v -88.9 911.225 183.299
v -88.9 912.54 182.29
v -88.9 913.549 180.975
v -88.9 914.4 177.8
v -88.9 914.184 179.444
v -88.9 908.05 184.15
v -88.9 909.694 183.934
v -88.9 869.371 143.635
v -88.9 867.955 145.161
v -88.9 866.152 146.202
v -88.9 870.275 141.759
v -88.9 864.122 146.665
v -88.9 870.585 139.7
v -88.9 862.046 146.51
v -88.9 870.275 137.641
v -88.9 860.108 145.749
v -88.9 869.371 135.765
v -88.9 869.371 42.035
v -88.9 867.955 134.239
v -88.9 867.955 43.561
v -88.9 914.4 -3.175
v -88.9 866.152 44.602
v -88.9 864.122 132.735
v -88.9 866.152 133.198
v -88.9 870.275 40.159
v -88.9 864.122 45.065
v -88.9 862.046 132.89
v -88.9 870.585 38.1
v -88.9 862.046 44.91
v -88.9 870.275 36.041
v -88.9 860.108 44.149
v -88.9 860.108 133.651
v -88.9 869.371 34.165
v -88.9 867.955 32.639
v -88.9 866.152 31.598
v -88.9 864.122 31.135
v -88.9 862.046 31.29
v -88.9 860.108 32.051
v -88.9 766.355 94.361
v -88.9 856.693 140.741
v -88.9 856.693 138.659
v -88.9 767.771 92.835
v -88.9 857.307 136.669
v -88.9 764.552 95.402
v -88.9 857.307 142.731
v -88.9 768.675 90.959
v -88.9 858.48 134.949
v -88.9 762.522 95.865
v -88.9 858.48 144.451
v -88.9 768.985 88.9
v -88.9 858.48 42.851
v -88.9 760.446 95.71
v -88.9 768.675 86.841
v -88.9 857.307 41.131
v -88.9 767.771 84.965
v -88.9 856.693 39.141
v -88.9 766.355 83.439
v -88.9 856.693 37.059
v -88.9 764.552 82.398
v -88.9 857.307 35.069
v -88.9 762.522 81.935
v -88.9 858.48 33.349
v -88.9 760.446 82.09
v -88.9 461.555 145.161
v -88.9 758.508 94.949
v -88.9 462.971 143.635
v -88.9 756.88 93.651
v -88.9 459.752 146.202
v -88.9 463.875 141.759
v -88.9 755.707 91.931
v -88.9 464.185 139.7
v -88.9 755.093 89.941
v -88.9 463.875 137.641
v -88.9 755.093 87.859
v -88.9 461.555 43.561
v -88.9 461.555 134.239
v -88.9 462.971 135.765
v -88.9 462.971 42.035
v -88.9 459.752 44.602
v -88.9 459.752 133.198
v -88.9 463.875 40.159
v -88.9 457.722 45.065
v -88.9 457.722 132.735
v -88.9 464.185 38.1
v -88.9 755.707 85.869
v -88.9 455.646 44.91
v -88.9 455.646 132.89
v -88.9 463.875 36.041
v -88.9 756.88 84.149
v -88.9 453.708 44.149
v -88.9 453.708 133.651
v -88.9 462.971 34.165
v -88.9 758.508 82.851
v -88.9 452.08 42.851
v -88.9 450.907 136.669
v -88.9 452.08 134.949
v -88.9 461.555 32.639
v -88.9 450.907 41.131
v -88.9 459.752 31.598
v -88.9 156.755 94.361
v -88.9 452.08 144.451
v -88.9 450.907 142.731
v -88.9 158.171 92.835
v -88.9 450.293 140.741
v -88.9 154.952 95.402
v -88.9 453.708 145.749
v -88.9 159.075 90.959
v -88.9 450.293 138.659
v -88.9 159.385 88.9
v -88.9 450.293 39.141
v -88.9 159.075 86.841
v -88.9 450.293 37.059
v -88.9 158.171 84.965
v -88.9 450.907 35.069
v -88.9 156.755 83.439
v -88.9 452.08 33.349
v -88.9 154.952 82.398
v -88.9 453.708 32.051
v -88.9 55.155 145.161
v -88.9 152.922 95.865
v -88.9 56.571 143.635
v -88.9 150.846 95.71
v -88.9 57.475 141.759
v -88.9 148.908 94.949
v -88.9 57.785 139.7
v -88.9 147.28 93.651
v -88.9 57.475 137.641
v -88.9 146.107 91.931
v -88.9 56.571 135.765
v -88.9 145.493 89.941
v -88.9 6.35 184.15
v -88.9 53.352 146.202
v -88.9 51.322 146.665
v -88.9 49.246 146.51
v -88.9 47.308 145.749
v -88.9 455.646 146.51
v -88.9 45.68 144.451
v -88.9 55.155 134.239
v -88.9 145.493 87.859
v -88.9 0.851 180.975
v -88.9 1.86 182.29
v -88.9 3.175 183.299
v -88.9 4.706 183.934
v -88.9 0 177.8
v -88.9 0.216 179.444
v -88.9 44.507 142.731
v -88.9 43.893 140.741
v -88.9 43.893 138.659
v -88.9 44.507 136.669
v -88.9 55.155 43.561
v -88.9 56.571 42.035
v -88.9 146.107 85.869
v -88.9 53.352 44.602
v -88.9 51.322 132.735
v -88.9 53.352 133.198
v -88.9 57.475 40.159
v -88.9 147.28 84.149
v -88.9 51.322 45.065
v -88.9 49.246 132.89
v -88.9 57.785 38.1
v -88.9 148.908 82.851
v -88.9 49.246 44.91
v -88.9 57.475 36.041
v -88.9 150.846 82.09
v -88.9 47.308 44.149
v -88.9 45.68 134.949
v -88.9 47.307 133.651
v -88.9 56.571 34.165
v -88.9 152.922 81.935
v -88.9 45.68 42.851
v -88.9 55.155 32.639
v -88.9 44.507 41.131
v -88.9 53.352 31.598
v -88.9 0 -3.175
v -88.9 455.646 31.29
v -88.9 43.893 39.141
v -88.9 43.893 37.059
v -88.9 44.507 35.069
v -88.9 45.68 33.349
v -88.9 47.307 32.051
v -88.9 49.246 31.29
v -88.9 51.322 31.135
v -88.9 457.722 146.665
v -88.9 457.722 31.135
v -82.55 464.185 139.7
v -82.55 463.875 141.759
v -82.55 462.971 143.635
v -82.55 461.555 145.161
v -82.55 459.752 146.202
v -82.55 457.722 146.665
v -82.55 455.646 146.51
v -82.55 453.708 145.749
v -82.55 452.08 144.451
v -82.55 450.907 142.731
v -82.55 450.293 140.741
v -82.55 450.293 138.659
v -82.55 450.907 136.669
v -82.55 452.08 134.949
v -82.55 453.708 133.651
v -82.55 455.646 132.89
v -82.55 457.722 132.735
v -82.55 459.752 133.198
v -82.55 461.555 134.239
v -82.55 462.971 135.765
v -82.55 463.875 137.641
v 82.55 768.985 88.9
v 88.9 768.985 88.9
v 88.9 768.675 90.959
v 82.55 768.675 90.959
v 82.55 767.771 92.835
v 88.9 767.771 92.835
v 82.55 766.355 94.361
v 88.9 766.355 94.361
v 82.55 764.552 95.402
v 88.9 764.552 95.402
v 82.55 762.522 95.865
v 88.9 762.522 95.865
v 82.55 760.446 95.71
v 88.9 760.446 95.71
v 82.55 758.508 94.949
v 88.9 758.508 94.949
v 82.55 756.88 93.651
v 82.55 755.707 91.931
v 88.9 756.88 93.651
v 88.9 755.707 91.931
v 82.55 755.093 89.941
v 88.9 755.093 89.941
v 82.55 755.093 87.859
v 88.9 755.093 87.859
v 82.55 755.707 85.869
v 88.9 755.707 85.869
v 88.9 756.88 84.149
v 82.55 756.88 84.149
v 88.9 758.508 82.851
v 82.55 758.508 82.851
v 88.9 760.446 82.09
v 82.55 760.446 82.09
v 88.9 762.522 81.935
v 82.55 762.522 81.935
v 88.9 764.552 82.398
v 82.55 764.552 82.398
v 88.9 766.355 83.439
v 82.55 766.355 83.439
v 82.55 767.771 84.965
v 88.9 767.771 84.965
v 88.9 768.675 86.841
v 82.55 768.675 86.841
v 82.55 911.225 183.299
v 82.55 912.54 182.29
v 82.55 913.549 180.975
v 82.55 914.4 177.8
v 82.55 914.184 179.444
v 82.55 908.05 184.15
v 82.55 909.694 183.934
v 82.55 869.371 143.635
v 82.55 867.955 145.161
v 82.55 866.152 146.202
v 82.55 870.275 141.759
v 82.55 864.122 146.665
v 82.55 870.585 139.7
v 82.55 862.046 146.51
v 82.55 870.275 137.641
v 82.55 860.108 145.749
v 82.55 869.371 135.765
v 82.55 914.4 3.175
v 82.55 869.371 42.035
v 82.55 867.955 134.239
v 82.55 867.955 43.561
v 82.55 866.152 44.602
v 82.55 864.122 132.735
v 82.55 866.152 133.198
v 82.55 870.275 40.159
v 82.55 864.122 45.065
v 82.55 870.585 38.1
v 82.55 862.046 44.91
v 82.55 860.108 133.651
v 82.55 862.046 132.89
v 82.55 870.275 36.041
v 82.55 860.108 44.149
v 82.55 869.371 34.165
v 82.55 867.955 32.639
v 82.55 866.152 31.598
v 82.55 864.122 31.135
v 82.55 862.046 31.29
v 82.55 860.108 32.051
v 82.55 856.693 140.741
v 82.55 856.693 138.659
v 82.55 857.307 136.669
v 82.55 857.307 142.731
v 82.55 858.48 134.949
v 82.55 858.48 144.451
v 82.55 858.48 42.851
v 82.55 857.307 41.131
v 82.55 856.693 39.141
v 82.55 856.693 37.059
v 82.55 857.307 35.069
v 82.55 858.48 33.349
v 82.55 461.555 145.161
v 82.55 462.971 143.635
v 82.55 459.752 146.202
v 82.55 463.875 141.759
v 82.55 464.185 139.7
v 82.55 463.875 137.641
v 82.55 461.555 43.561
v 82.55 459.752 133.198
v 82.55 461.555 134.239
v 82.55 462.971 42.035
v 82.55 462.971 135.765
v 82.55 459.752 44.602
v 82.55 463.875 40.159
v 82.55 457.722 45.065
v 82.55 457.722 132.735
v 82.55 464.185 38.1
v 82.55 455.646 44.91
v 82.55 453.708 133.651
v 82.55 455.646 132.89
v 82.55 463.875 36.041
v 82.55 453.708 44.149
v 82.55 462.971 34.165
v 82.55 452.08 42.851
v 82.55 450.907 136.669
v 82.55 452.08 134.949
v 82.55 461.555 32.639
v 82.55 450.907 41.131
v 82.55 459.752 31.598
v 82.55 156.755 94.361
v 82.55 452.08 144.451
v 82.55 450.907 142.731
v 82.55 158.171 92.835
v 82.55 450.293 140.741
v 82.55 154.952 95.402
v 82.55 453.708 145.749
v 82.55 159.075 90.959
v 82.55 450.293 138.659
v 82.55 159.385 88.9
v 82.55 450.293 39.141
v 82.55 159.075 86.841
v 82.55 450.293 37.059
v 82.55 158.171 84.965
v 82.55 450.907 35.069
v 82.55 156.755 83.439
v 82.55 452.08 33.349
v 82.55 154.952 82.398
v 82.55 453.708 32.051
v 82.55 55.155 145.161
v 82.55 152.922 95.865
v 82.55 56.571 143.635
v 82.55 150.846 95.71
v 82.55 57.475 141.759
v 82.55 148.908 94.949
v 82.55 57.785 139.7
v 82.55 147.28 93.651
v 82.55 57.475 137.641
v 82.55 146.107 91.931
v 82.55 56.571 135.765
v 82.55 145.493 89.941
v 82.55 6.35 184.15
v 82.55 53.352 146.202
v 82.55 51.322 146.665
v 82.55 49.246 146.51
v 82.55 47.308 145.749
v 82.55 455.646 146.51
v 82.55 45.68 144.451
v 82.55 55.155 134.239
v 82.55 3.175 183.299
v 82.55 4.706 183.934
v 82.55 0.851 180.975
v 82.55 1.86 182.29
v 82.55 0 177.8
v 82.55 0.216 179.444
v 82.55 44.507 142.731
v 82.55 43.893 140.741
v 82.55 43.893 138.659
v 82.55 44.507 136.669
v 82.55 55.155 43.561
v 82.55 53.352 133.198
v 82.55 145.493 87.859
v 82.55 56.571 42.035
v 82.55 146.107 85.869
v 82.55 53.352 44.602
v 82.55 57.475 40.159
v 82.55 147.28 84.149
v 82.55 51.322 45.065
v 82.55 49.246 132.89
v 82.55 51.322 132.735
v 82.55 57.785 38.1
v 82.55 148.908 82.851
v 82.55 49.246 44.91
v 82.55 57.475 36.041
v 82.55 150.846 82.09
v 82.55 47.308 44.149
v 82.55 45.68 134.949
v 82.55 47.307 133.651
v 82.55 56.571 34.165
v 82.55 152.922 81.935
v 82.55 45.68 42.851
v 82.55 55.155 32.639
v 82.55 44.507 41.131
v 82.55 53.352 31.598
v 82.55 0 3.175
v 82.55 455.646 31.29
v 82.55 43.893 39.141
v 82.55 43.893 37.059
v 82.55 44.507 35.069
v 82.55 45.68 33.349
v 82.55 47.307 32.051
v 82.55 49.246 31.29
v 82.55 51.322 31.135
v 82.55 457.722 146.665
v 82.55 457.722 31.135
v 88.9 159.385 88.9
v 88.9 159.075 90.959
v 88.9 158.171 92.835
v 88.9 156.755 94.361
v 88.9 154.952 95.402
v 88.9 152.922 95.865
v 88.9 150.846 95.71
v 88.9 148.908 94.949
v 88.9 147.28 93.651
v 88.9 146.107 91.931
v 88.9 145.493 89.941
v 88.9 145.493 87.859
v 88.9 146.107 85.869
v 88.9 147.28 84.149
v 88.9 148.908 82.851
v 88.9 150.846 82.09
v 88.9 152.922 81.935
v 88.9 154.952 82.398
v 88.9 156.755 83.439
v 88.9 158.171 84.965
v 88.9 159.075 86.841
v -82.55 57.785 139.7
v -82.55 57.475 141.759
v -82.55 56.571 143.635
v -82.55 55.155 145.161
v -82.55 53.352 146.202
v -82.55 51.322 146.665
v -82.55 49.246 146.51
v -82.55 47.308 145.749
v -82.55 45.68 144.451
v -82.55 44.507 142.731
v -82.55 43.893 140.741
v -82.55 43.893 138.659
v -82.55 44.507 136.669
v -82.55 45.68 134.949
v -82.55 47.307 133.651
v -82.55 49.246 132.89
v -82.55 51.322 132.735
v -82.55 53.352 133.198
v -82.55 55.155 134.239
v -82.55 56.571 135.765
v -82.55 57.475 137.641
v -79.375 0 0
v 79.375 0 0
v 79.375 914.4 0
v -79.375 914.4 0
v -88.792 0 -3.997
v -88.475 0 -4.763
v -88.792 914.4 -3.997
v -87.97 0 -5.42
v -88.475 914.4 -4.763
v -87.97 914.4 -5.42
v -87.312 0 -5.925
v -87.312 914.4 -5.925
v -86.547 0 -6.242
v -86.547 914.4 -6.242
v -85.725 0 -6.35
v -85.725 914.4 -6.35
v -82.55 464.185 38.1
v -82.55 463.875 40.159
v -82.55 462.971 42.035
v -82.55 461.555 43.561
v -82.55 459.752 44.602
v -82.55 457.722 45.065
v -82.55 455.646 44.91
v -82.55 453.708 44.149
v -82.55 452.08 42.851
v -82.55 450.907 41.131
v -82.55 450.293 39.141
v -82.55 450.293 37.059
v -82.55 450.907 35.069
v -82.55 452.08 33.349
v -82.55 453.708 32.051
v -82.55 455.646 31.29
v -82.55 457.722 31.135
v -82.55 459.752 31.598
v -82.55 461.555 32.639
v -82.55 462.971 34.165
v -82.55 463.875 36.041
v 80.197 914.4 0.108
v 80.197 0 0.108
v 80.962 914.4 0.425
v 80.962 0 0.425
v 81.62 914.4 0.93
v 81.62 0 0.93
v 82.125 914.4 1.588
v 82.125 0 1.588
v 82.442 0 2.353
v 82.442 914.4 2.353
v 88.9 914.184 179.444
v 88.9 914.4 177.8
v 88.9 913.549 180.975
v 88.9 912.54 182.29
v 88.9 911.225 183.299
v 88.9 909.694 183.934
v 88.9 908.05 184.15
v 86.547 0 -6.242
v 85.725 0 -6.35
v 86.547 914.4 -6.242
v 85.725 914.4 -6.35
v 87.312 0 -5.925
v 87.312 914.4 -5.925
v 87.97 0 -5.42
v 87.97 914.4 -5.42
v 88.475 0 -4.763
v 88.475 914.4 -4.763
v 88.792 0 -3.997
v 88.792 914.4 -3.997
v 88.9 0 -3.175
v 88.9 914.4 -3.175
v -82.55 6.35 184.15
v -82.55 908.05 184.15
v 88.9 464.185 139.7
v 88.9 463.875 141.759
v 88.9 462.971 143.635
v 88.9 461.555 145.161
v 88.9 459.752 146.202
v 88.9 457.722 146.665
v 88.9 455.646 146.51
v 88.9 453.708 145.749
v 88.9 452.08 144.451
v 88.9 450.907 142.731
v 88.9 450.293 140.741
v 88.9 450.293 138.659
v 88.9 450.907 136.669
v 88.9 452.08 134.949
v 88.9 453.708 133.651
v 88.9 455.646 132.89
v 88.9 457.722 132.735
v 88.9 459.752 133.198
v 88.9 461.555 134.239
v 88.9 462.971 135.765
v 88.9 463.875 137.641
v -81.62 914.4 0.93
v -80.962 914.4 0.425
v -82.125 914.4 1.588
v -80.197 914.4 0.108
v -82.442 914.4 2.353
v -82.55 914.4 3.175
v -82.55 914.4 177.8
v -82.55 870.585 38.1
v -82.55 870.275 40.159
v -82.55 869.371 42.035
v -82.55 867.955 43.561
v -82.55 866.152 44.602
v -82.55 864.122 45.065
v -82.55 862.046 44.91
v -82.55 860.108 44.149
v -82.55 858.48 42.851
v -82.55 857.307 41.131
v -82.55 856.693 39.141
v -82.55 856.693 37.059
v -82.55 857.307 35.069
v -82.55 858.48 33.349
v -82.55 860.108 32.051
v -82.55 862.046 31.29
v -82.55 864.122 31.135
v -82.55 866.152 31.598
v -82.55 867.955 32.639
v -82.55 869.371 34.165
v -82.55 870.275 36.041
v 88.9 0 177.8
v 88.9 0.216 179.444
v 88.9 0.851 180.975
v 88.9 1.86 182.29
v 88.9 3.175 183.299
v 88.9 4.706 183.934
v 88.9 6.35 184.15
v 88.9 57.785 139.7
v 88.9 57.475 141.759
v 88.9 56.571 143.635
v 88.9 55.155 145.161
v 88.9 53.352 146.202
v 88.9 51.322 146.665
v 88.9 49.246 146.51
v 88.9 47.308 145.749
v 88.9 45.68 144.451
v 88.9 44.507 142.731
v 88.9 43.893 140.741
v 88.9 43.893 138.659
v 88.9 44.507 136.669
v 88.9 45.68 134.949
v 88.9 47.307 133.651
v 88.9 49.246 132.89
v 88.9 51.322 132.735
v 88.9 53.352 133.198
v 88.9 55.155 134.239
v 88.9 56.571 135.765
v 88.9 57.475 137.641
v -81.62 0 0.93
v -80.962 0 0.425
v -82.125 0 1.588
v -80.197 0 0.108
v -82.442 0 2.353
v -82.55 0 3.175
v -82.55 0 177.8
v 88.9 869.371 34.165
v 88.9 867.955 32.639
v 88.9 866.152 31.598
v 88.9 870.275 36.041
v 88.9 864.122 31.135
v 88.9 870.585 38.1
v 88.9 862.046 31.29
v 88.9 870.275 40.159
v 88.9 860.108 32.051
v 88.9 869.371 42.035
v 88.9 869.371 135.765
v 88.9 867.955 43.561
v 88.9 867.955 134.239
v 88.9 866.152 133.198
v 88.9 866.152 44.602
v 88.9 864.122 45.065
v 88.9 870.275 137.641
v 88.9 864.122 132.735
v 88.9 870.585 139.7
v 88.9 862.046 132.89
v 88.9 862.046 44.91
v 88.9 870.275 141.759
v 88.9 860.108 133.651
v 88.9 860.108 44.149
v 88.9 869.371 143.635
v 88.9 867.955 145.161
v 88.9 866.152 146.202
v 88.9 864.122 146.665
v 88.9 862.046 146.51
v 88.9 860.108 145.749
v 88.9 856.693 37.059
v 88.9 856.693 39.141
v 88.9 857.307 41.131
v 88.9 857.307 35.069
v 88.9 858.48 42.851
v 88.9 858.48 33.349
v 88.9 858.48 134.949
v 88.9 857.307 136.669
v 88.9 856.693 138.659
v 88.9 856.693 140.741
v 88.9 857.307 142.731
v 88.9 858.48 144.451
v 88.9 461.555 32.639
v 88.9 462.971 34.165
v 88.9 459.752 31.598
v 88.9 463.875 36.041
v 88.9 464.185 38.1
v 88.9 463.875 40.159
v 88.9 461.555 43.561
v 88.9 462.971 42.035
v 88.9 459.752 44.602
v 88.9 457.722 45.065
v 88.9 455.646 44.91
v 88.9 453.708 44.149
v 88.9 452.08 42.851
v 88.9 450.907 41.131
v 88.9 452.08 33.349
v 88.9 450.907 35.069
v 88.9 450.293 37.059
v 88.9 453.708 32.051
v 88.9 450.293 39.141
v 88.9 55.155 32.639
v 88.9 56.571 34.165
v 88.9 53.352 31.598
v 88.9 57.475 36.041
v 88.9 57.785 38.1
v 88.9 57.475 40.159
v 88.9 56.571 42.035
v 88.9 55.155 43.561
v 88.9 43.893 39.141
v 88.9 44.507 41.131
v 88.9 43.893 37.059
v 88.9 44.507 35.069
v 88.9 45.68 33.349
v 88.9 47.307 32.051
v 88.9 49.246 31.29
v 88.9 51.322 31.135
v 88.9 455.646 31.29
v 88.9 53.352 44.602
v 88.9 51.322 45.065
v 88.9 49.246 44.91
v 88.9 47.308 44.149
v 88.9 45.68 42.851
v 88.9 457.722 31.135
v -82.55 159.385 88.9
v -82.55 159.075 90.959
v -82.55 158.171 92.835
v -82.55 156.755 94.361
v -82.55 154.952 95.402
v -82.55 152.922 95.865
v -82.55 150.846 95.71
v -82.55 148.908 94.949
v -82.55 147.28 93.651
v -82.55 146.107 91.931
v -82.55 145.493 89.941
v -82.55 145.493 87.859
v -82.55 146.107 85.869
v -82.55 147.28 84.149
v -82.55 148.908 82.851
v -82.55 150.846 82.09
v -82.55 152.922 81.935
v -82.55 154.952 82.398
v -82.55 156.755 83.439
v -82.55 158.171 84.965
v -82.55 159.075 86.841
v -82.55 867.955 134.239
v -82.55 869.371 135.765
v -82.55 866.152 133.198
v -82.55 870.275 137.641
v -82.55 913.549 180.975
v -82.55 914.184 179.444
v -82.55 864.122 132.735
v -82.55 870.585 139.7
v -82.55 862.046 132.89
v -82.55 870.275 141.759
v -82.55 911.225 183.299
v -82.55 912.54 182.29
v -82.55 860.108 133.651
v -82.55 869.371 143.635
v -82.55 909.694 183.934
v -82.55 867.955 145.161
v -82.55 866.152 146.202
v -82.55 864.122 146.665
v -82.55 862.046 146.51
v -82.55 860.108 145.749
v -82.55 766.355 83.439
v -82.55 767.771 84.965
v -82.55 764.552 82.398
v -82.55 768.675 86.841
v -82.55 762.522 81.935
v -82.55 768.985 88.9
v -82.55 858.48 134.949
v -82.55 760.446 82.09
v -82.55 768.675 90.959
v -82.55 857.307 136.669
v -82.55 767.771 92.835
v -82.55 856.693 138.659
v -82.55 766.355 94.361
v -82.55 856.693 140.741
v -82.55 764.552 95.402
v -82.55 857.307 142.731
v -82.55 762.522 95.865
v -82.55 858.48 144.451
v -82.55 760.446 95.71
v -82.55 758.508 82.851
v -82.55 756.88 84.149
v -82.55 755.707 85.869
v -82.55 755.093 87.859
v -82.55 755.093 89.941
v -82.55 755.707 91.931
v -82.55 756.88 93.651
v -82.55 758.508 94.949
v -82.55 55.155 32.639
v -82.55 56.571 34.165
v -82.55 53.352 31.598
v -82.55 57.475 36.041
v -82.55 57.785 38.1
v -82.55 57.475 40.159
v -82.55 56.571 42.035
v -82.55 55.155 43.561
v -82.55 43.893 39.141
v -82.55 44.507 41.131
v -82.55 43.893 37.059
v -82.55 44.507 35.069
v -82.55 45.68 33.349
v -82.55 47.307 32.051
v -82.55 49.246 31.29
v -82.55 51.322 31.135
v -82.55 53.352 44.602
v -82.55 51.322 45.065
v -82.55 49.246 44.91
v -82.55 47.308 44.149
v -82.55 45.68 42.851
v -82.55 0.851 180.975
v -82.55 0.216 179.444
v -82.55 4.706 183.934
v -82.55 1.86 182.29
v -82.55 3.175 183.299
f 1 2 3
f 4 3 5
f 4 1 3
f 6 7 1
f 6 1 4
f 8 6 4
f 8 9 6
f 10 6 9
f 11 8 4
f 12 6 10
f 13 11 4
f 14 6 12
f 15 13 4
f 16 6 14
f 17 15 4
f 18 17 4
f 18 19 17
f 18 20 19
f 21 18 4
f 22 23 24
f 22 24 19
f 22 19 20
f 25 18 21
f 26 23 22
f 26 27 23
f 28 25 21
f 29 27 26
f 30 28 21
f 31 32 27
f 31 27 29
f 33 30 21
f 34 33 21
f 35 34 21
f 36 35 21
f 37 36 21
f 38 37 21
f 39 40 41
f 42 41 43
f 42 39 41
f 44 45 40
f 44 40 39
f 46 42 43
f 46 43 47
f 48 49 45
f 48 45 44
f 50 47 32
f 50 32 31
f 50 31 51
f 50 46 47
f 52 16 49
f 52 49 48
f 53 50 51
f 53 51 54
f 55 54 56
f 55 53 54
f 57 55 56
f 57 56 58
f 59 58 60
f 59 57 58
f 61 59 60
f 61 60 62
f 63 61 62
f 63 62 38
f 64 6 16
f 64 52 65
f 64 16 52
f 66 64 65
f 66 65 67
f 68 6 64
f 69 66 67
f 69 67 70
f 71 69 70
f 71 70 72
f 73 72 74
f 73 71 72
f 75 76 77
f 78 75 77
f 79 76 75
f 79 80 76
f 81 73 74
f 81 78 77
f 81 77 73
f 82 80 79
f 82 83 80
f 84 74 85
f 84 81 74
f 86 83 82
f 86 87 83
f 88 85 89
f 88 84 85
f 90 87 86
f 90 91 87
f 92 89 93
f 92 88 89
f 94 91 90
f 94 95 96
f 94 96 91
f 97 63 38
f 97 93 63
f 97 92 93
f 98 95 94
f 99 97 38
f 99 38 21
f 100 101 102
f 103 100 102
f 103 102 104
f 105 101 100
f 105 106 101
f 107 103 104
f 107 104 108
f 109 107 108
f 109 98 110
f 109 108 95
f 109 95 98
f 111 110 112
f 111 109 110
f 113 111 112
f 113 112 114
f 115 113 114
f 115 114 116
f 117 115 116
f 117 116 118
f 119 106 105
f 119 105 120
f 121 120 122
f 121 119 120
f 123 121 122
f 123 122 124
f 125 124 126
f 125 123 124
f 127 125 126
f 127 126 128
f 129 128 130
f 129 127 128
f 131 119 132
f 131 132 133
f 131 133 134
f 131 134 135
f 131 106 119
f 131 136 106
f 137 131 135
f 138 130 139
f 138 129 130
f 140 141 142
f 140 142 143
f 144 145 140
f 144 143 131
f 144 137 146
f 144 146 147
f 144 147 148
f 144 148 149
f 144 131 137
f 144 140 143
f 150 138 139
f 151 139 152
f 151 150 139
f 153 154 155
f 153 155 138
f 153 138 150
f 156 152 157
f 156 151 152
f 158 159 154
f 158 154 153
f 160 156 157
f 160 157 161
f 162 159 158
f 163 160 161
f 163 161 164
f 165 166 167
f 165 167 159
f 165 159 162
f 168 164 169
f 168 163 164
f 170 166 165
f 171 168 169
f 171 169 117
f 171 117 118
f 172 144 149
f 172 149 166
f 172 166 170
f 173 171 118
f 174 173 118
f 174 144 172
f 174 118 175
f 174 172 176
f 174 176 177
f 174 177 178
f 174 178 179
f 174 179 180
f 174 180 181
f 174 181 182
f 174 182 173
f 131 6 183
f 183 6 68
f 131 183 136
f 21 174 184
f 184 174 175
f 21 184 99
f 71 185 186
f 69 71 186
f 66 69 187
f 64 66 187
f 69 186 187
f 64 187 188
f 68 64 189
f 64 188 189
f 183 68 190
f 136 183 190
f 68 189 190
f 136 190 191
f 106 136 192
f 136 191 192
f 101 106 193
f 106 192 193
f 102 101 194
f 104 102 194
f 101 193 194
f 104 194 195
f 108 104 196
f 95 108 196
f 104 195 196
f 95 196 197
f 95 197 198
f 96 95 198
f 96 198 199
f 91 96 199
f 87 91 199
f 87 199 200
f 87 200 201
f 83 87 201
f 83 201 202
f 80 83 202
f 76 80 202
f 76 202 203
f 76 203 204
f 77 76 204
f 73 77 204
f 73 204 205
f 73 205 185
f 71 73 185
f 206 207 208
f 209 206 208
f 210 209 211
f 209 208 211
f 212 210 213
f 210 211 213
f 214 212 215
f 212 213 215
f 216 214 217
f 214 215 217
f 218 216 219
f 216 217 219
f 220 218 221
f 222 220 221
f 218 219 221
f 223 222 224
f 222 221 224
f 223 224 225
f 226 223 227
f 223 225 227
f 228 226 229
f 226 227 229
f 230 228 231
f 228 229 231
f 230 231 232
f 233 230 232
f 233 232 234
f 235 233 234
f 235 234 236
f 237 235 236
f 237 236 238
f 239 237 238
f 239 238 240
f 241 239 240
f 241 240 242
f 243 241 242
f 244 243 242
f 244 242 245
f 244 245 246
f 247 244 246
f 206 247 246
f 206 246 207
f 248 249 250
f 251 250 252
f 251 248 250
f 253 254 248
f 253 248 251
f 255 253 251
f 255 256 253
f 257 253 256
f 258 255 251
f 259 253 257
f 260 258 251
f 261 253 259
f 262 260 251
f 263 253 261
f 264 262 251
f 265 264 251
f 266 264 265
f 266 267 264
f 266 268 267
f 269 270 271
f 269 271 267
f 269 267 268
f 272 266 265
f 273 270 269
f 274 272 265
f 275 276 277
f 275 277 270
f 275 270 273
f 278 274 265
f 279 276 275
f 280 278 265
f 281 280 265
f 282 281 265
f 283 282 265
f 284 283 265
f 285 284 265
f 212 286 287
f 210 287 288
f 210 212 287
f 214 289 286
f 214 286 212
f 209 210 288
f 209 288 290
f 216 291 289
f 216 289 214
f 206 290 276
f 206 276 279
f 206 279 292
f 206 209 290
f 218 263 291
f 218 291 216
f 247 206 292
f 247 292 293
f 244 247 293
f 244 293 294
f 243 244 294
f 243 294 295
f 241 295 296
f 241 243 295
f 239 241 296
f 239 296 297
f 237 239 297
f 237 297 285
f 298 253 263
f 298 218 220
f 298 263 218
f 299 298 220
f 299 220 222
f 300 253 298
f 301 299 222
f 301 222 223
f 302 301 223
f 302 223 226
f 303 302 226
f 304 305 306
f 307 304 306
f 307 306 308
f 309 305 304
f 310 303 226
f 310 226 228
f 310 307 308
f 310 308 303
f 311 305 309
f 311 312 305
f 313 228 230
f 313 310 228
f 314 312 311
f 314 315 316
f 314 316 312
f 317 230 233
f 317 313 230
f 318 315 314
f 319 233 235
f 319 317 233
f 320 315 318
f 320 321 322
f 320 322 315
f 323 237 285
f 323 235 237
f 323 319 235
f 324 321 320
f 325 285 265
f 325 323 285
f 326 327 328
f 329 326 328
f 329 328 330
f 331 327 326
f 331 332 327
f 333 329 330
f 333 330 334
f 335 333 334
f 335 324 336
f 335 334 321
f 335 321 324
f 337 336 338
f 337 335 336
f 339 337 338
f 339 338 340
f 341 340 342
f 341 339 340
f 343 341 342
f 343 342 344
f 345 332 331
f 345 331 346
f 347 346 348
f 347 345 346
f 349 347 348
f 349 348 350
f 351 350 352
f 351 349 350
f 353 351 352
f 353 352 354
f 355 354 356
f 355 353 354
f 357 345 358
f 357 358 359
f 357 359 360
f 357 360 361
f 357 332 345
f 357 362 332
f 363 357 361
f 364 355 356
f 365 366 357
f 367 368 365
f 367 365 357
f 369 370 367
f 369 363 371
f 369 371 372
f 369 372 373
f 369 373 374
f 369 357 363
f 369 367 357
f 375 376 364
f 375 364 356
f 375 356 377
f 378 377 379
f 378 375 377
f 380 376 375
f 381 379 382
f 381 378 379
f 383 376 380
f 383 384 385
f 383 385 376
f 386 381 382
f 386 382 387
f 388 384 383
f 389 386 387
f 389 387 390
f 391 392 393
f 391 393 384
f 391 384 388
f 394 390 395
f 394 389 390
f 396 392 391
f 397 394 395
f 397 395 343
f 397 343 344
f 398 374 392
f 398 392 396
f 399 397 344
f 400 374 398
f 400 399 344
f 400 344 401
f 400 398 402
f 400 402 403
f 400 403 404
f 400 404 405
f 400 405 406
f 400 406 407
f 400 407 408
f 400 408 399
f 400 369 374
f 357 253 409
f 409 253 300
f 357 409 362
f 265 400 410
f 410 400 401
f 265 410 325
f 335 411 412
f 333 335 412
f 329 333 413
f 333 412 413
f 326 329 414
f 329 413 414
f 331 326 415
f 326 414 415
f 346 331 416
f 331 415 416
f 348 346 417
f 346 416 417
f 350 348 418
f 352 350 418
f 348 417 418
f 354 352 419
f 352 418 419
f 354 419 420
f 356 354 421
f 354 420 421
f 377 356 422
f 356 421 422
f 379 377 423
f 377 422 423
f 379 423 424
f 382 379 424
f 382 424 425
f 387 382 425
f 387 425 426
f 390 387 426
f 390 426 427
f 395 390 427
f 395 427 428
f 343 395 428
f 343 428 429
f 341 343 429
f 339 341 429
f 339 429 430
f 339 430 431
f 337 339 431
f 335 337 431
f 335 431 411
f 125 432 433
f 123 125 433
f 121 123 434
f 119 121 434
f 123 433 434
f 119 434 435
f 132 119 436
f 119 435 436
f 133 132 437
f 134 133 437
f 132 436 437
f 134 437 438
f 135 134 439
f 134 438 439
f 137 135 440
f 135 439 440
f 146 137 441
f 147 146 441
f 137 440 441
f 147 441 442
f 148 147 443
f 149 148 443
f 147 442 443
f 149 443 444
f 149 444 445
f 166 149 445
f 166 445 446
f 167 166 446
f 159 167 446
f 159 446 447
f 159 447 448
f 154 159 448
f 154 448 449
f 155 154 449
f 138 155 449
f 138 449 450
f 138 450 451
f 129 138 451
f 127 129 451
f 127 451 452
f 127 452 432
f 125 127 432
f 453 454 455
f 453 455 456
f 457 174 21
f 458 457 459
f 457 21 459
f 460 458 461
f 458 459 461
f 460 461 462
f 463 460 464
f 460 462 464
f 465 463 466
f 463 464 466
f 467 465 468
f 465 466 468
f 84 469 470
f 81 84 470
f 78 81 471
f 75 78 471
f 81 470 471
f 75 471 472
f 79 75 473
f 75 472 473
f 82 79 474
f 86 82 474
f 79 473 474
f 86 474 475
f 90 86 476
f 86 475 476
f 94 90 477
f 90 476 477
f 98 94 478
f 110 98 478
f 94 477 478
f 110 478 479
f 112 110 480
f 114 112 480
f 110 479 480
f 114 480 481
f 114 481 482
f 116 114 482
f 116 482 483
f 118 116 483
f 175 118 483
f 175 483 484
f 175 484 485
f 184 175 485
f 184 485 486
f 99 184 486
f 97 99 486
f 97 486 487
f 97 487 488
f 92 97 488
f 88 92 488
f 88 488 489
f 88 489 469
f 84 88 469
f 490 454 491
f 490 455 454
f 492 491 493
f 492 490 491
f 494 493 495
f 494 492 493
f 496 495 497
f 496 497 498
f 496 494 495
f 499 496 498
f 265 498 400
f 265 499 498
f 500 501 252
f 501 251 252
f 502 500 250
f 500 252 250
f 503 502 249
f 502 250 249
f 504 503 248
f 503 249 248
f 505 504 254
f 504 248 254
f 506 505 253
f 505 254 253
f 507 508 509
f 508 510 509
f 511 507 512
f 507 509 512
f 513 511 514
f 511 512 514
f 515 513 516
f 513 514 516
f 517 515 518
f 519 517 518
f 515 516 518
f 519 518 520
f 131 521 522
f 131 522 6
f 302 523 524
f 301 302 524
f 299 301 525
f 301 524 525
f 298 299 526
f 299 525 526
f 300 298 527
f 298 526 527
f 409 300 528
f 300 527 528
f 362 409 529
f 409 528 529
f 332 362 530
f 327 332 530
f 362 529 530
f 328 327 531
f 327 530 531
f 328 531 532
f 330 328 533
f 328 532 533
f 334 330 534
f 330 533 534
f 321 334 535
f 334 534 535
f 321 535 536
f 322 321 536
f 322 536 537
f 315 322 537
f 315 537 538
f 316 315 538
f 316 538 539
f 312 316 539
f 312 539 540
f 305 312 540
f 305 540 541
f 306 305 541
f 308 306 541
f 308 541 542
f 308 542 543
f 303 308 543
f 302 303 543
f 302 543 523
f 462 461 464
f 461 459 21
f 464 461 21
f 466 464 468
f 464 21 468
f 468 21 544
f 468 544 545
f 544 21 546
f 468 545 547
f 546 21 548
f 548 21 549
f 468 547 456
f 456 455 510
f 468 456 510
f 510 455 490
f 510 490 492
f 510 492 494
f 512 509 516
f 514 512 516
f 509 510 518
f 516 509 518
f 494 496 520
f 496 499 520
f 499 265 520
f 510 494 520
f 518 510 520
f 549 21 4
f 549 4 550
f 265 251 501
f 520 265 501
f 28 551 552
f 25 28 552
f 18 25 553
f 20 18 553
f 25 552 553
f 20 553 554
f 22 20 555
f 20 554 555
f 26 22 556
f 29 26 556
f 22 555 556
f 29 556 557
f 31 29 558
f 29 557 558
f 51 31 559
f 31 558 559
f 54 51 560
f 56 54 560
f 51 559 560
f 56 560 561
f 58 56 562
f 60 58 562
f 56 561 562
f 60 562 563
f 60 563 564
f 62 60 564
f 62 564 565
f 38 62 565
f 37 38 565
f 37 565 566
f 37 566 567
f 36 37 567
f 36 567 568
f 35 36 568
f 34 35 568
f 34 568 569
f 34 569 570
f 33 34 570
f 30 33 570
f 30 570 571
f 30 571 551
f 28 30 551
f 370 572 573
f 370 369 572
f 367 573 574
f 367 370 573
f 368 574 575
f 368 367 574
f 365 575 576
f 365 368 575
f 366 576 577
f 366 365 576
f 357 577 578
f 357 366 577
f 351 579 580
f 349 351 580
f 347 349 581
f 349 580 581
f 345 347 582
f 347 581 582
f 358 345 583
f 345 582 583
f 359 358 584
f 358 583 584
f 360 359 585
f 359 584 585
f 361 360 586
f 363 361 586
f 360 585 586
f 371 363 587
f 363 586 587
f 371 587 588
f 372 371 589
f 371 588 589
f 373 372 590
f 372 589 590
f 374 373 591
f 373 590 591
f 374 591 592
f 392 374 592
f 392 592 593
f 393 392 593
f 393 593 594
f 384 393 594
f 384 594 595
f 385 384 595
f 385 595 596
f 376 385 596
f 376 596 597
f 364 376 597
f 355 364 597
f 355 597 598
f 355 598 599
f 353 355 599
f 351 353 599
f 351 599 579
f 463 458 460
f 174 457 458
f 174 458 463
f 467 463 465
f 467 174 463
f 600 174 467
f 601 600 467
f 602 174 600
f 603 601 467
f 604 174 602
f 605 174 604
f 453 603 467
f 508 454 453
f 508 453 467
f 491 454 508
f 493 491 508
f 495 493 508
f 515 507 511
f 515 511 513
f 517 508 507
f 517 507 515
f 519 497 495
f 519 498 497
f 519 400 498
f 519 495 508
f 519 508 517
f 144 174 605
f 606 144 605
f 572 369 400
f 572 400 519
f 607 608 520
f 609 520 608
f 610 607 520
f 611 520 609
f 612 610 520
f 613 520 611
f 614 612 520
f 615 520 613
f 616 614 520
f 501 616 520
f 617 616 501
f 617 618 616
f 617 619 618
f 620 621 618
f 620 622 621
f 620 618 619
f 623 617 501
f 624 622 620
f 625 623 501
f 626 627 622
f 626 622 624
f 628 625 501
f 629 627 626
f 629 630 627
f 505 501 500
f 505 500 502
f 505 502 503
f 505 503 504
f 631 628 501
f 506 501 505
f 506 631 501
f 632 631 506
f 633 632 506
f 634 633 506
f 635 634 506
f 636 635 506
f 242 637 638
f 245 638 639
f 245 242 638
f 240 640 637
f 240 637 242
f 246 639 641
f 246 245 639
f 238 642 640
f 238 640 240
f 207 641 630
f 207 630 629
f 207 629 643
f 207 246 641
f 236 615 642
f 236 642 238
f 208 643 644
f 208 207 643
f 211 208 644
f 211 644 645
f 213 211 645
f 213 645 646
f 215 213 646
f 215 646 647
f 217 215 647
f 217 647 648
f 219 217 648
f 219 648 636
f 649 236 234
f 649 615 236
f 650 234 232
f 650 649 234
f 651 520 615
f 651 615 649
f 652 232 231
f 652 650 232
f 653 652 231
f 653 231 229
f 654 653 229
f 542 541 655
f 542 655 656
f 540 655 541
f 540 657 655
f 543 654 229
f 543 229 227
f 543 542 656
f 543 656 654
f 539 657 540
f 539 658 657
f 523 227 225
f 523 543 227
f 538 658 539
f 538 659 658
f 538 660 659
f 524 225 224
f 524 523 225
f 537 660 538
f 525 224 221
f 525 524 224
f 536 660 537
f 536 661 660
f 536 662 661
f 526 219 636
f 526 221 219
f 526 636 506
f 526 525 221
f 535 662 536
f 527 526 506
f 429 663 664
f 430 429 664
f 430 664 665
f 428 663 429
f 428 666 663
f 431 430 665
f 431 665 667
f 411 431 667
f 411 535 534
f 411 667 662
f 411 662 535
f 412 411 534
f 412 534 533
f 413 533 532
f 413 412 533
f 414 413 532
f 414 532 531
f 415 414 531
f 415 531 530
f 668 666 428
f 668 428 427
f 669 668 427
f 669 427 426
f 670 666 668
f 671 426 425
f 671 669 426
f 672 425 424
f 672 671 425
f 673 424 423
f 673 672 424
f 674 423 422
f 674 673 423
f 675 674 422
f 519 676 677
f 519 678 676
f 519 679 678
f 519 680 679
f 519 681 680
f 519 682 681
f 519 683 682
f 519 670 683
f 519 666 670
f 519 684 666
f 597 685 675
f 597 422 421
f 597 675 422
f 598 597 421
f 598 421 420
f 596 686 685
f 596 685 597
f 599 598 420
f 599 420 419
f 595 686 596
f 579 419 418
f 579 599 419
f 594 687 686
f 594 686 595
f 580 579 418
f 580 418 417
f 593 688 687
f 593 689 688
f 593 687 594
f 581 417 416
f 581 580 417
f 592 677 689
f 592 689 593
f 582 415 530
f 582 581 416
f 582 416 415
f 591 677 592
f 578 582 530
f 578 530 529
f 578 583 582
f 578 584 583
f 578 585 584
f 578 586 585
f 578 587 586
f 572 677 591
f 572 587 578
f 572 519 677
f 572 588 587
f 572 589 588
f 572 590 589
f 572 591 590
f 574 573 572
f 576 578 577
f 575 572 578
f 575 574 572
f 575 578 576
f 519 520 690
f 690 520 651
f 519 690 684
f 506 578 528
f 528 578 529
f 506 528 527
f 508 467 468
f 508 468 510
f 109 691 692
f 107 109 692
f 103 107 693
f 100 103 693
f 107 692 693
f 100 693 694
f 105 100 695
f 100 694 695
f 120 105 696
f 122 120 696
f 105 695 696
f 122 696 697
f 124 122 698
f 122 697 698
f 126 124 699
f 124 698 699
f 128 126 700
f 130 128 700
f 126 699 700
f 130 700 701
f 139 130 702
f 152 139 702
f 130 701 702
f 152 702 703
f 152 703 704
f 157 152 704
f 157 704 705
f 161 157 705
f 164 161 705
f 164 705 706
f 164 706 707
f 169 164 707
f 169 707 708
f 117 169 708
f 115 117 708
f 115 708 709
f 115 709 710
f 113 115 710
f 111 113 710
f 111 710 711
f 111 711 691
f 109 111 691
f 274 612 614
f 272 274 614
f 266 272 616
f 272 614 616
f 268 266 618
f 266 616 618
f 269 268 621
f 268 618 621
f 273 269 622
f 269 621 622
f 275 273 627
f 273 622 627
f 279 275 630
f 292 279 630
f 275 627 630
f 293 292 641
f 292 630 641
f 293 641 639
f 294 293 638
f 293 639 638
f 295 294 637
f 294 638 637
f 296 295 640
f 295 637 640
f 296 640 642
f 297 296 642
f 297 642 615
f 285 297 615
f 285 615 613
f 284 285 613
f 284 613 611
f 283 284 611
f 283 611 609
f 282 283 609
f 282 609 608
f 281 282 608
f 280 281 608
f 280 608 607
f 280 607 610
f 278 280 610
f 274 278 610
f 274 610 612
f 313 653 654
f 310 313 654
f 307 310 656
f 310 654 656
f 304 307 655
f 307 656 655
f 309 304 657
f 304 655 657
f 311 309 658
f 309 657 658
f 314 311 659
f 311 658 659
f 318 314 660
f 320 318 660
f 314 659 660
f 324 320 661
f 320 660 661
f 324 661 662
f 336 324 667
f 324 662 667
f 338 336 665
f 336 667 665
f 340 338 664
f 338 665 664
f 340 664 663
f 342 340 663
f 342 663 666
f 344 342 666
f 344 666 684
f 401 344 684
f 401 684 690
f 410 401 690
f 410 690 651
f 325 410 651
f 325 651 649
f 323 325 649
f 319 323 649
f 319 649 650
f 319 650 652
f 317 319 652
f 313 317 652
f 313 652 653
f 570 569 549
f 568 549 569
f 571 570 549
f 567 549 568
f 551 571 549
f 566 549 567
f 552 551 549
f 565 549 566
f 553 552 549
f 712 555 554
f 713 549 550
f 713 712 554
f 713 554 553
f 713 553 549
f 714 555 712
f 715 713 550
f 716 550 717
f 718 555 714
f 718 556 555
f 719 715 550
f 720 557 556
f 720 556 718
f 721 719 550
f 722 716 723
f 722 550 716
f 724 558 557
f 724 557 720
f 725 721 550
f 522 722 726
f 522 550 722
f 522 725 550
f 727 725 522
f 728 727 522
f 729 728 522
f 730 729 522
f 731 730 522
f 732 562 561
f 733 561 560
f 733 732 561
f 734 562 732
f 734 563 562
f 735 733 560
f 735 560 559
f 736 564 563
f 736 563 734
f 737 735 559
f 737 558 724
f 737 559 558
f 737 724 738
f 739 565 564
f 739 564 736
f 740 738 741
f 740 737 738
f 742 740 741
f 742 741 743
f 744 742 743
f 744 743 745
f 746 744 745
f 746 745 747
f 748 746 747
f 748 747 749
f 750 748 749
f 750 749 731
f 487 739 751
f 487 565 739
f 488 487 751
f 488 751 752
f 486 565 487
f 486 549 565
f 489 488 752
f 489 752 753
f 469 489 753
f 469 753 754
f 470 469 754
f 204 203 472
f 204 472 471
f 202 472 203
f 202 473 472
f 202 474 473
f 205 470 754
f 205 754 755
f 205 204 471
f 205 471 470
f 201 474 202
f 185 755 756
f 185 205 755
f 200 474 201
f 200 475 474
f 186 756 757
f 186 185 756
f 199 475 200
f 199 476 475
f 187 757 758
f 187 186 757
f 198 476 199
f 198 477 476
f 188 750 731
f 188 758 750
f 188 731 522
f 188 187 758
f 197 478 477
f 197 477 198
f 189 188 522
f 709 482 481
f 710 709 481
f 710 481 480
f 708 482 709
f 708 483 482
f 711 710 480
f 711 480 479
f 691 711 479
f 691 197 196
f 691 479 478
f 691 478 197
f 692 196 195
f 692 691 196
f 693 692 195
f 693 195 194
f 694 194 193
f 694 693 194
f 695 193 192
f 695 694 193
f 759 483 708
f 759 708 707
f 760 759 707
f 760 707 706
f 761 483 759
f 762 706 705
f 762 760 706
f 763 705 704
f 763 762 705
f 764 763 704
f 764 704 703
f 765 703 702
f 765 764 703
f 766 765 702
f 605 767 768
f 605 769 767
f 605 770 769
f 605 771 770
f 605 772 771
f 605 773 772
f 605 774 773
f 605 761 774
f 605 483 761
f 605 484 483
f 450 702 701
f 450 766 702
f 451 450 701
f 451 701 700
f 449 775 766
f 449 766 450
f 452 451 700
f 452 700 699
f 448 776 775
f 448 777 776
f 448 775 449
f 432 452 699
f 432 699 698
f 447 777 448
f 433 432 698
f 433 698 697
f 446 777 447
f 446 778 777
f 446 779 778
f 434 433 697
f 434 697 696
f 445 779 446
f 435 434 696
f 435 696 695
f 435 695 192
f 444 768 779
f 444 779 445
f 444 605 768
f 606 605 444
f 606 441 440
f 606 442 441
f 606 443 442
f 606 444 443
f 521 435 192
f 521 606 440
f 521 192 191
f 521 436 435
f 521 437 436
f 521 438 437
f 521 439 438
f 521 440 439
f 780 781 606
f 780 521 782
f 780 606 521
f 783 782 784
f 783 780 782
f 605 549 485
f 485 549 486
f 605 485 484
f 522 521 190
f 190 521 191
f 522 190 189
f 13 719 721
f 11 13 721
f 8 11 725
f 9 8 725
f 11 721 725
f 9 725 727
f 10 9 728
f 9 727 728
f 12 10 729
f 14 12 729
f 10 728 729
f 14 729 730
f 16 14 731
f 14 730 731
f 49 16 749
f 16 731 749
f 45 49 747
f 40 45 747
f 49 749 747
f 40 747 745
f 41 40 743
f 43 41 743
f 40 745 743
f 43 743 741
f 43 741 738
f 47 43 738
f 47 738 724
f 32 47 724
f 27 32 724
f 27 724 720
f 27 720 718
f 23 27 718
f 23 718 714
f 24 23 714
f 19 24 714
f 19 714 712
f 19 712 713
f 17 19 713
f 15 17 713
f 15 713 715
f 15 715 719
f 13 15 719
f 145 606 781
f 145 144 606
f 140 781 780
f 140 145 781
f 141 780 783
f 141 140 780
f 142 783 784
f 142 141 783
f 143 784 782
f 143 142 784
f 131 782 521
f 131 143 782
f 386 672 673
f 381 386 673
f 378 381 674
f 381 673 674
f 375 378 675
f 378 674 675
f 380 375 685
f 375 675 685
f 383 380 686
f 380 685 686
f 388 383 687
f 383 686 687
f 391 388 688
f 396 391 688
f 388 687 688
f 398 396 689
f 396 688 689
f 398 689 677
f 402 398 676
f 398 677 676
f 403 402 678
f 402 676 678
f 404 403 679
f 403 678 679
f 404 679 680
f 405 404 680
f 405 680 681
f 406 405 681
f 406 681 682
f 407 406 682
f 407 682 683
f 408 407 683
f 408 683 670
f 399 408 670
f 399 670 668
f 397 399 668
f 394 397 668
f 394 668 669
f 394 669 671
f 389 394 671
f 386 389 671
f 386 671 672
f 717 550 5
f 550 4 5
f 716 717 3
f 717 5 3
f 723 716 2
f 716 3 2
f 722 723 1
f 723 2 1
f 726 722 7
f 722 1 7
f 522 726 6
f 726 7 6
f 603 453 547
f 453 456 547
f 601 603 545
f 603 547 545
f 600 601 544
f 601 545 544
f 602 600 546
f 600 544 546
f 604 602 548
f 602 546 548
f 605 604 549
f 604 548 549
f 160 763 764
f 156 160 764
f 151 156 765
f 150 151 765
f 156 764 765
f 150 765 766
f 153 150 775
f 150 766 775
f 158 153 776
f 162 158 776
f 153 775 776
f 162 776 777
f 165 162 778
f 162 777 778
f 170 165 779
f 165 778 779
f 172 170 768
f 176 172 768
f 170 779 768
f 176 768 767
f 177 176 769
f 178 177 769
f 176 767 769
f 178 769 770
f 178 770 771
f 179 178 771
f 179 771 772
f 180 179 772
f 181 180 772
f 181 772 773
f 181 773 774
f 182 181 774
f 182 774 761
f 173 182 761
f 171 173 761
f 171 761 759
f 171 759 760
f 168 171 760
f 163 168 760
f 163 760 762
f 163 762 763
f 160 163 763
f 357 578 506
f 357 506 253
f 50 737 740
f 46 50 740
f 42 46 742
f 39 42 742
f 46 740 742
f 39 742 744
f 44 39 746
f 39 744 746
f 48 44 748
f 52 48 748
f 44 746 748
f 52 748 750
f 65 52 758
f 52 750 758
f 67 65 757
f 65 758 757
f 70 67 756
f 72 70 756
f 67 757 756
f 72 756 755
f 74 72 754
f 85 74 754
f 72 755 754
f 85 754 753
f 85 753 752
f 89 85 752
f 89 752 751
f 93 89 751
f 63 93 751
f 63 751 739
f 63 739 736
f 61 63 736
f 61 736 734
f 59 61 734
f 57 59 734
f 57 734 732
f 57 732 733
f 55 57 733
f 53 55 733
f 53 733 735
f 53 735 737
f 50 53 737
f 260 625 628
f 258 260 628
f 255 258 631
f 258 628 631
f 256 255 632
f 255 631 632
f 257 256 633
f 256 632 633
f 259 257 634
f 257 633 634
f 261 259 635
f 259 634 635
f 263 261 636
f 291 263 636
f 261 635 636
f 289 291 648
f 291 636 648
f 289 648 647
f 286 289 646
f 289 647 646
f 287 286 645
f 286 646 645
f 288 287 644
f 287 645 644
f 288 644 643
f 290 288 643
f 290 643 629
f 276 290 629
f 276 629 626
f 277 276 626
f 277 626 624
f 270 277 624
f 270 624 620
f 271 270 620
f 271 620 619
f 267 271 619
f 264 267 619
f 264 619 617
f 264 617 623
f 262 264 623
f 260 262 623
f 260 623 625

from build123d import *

# Parameters (mm, degrees)
F1_DEPTH = 914.4
F2_R     = 6.985
F3_DEPTH = 177.801
F4_R     = 3.175
F5_R     = 6.35


with BuildPart() as f1:
    # F0 (on Front) → F1 (new body)
    with BuildSketch(Plane.XZ):
        Polygon((82.55, 0), (-82.55, 0), (-82.55, 184.15), (-88.9, 184.15), (-88.9, -6.35), (88.9, -6.35), (88.9, 184.15), (82.55, 184.15), align=None)
    extrude(amount=-F1_DEPTH)

    # F2 (on face) → F3 (cut, through all)
    with BuildSketch(Plane.YZ.offset(88.9)):
        with Locations((50.8, 139.7)):
            Circle(F2_R)
        with Locations((152.4, 88.9)):
            Circle(F2_R)
        with Locations((457.2, 139.7)):
            Circle(F2_R)
        with Locations((50.8, 38.1)):
            Circle(F2_R)
        with Locations((457.2, 38.1)):
            Circle(F2_R)
        with Locations((762, 88.9)):
            Circle(F2_R)
        with Locations((863.6, 38.1)):
            Circle(F2_R)
        with Locations((863.6, 139.7)):
            Circle(F2_R)
    extrude(amount=-F3_DEPTH, mode=Mode.SUBTRACT)

    # F4
    f4_edges = [f1.edges().sort_by_distance(p)[0] for p in [
        (88.9, 457.2, -6.35),
        (-88.9, 457.2, -6.35),
        (-82.55, 457.2, 0),
        (82.55, 457.2, 0),
    ]]
    fillet(f4_edges, radius=F4_R)

    # F5
    f5_edges = [f1.edges().sort_by_distance(p)[0] for p in [
        (-85.725, 0, 184.15),
        (85.725, 0, 184.15),
        (85.725, 914.4, 184.15),
        (-85.725, 914.4, 184.15),
    ]]
    fillet(f5_edges, radius=F5_R)


solid = f1.part
